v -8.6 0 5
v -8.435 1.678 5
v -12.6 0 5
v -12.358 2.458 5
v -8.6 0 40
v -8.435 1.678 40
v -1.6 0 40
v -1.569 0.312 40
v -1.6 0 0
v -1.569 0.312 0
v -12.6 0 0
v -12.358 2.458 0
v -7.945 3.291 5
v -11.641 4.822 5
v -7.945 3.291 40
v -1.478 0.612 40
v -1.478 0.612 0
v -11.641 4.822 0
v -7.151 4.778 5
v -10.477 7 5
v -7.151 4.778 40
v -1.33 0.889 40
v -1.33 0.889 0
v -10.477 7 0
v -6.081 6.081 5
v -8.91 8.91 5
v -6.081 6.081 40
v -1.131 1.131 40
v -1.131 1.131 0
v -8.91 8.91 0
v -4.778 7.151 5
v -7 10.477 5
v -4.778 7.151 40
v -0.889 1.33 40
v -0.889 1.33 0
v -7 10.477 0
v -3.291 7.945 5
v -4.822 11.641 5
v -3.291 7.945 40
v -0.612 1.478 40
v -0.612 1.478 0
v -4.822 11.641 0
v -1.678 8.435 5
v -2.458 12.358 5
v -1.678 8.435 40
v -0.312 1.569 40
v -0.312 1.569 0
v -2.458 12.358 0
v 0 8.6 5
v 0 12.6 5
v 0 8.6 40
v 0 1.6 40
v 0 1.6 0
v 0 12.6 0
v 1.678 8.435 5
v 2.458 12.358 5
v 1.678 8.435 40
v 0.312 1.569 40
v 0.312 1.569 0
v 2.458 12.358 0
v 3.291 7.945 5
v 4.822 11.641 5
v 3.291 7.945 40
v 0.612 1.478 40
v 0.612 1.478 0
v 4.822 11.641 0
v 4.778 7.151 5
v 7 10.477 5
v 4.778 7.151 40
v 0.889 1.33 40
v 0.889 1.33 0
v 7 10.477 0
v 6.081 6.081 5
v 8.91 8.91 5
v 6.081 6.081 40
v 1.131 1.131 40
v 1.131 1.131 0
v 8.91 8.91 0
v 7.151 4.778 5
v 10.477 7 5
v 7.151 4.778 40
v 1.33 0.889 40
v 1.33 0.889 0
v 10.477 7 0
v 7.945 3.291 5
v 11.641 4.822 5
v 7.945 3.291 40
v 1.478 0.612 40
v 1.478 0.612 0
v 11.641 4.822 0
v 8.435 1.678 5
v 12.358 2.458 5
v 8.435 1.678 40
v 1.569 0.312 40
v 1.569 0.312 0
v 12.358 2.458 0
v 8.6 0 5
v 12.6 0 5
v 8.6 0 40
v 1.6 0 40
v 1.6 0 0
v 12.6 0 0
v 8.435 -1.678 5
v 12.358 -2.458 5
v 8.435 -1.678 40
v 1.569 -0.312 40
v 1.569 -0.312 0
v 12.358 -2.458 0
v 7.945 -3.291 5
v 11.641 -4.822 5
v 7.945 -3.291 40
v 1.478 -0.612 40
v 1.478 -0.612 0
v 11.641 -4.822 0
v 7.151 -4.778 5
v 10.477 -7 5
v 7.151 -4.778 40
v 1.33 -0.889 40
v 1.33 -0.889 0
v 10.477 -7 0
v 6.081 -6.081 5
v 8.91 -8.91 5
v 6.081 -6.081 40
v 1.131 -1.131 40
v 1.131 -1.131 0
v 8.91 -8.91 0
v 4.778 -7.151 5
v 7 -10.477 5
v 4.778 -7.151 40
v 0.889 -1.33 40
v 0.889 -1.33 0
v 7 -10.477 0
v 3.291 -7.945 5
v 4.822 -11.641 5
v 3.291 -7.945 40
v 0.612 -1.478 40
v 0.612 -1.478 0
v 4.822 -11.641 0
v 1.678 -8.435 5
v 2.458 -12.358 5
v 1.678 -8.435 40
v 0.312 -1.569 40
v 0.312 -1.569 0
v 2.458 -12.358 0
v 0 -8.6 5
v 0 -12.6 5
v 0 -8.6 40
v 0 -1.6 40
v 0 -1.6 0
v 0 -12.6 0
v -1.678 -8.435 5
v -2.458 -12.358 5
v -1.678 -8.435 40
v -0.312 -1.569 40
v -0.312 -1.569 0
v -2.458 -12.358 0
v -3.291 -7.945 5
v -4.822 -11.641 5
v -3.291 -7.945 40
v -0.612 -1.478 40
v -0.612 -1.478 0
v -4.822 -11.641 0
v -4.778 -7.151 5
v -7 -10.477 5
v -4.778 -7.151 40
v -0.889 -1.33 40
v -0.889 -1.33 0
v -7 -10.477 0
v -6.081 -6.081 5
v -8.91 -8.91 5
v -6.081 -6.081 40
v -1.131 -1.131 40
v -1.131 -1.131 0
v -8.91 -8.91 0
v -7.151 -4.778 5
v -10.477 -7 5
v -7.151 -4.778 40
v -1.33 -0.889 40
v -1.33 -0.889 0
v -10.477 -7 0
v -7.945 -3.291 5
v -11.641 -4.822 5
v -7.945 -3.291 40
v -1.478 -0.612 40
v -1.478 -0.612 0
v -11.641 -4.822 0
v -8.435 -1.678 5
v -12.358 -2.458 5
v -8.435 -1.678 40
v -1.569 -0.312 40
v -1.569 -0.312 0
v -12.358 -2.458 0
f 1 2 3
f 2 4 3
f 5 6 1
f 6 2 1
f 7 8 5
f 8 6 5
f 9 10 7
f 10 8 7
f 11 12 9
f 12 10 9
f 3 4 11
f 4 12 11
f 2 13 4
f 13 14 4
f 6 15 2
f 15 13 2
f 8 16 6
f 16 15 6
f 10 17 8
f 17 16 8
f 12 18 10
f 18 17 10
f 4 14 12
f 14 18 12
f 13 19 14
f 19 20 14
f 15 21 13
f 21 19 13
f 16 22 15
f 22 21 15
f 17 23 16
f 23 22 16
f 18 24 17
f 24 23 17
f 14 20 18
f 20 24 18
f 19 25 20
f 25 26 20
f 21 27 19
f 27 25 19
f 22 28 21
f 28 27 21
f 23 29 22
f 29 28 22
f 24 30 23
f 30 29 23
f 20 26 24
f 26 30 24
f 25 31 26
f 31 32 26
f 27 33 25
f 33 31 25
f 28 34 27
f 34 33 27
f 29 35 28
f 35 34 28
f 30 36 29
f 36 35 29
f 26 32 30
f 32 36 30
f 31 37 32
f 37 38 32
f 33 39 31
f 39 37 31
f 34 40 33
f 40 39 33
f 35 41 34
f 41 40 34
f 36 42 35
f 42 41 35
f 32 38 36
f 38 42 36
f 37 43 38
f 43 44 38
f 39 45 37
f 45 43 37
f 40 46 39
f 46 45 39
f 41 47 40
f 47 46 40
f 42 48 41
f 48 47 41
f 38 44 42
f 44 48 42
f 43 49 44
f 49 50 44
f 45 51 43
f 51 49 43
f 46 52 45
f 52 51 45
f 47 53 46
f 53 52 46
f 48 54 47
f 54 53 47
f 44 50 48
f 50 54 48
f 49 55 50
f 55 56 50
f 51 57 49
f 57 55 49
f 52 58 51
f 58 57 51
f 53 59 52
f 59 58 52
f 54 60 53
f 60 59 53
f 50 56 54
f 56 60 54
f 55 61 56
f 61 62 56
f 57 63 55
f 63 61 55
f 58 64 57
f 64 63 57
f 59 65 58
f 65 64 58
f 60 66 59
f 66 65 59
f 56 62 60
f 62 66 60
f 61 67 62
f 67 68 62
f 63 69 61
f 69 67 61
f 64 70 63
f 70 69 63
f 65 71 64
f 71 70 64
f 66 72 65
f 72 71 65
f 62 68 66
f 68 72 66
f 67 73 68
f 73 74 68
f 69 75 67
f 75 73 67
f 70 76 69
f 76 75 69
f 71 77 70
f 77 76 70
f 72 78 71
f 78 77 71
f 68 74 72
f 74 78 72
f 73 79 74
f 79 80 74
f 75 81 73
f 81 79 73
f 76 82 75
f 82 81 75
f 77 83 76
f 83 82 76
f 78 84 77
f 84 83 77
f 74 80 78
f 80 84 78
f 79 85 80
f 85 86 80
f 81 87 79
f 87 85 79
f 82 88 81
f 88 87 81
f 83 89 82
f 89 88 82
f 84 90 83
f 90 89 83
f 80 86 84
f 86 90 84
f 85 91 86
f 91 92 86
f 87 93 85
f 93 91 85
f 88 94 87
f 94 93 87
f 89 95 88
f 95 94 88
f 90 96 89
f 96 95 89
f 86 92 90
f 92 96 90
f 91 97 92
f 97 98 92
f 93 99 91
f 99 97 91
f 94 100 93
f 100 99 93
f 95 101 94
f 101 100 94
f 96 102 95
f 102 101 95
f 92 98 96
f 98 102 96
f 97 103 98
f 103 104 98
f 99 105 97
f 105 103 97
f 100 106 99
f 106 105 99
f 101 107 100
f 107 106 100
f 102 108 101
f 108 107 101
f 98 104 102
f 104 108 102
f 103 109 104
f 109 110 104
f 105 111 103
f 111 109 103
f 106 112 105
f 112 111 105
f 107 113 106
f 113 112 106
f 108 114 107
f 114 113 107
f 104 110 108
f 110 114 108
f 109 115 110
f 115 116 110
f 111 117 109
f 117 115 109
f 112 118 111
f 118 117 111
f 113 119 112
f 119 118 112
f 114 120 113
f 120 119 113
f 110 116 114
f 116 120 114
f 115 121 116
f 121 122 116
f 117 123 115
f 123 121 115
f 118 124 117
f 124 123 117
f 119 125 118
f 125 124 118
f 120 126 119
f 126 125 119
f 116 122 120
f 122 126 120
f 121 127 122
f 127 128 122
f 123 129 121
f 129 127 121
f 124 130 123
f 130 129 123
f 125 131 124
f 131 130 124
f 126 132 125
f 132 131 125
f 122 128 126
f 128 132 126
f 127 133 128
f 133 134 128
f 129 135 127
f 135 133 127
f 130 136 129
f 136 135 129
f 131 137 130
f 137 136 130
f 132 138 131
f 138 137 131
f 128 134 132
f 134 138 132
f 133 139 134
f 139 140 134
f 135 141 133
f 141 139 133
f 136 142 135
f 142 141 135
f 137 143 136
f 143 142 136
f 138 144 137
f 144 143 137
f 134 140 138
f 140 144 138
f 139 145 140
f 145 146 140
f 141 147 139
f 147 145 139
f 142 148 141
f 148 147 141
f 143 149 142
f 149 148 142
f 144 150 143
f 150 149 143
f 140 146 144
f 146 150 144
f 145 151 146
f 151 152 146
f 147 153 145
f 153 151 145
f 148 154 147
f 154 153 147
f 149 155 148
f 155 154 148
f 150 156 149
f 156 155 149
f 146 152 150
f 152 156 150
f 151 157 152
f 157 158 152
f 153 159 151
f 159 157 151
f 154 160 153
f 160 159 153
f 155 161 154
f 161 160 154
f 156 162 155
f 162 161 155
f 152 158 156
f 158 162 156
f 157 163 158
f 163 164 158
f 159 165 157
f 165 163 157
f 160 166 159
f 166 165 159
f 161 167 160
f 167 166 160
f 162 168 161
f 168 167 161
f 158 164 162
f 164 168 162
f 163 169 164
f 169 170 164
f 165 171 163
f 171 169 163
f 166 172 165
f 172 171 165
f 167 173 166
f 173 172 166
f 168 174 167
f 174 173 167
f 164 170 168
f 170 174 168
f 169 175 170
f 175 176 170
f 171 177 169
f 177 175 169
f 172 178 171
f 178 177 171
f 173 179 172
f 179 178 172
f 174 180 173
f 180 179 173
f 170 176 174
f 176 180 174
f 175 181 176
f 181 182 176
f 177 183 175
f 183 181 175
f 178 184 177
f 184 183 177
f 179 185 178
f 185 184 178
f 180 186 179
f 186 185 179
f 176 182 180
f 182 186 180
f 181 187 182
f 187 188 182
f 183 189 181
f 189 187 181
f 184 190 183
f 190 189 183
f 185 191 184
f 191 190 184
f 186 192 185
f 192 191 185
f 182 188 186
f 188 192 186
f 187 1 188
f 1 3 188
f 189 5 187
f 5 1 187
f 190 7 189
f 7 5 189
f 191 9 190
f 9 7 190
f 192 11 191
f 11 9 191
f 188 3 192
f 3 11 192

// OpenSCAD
$fn = 32;

// ----------------------------------------------------------------------
// Profiled standoff: flanged spacer, 40 mm long, bore 3.2 mm
// ----------------------------------------------------------------------

// --- parameters (mm) ---
revolve_angle = 360;      // full turn around the Z axis
profile_points = 6;       // points of the closed outline

profile = [[1.6, 0], [12.6, 0], [12.6, 5], [8.6, 5], [8.6, 40], [1.6, 40]];  // single closed polygon, 6 points, counter clockwise

// --- the one profile operation ---
rotate_extrude(angle = revolve_angle) polygon(points = profile);
